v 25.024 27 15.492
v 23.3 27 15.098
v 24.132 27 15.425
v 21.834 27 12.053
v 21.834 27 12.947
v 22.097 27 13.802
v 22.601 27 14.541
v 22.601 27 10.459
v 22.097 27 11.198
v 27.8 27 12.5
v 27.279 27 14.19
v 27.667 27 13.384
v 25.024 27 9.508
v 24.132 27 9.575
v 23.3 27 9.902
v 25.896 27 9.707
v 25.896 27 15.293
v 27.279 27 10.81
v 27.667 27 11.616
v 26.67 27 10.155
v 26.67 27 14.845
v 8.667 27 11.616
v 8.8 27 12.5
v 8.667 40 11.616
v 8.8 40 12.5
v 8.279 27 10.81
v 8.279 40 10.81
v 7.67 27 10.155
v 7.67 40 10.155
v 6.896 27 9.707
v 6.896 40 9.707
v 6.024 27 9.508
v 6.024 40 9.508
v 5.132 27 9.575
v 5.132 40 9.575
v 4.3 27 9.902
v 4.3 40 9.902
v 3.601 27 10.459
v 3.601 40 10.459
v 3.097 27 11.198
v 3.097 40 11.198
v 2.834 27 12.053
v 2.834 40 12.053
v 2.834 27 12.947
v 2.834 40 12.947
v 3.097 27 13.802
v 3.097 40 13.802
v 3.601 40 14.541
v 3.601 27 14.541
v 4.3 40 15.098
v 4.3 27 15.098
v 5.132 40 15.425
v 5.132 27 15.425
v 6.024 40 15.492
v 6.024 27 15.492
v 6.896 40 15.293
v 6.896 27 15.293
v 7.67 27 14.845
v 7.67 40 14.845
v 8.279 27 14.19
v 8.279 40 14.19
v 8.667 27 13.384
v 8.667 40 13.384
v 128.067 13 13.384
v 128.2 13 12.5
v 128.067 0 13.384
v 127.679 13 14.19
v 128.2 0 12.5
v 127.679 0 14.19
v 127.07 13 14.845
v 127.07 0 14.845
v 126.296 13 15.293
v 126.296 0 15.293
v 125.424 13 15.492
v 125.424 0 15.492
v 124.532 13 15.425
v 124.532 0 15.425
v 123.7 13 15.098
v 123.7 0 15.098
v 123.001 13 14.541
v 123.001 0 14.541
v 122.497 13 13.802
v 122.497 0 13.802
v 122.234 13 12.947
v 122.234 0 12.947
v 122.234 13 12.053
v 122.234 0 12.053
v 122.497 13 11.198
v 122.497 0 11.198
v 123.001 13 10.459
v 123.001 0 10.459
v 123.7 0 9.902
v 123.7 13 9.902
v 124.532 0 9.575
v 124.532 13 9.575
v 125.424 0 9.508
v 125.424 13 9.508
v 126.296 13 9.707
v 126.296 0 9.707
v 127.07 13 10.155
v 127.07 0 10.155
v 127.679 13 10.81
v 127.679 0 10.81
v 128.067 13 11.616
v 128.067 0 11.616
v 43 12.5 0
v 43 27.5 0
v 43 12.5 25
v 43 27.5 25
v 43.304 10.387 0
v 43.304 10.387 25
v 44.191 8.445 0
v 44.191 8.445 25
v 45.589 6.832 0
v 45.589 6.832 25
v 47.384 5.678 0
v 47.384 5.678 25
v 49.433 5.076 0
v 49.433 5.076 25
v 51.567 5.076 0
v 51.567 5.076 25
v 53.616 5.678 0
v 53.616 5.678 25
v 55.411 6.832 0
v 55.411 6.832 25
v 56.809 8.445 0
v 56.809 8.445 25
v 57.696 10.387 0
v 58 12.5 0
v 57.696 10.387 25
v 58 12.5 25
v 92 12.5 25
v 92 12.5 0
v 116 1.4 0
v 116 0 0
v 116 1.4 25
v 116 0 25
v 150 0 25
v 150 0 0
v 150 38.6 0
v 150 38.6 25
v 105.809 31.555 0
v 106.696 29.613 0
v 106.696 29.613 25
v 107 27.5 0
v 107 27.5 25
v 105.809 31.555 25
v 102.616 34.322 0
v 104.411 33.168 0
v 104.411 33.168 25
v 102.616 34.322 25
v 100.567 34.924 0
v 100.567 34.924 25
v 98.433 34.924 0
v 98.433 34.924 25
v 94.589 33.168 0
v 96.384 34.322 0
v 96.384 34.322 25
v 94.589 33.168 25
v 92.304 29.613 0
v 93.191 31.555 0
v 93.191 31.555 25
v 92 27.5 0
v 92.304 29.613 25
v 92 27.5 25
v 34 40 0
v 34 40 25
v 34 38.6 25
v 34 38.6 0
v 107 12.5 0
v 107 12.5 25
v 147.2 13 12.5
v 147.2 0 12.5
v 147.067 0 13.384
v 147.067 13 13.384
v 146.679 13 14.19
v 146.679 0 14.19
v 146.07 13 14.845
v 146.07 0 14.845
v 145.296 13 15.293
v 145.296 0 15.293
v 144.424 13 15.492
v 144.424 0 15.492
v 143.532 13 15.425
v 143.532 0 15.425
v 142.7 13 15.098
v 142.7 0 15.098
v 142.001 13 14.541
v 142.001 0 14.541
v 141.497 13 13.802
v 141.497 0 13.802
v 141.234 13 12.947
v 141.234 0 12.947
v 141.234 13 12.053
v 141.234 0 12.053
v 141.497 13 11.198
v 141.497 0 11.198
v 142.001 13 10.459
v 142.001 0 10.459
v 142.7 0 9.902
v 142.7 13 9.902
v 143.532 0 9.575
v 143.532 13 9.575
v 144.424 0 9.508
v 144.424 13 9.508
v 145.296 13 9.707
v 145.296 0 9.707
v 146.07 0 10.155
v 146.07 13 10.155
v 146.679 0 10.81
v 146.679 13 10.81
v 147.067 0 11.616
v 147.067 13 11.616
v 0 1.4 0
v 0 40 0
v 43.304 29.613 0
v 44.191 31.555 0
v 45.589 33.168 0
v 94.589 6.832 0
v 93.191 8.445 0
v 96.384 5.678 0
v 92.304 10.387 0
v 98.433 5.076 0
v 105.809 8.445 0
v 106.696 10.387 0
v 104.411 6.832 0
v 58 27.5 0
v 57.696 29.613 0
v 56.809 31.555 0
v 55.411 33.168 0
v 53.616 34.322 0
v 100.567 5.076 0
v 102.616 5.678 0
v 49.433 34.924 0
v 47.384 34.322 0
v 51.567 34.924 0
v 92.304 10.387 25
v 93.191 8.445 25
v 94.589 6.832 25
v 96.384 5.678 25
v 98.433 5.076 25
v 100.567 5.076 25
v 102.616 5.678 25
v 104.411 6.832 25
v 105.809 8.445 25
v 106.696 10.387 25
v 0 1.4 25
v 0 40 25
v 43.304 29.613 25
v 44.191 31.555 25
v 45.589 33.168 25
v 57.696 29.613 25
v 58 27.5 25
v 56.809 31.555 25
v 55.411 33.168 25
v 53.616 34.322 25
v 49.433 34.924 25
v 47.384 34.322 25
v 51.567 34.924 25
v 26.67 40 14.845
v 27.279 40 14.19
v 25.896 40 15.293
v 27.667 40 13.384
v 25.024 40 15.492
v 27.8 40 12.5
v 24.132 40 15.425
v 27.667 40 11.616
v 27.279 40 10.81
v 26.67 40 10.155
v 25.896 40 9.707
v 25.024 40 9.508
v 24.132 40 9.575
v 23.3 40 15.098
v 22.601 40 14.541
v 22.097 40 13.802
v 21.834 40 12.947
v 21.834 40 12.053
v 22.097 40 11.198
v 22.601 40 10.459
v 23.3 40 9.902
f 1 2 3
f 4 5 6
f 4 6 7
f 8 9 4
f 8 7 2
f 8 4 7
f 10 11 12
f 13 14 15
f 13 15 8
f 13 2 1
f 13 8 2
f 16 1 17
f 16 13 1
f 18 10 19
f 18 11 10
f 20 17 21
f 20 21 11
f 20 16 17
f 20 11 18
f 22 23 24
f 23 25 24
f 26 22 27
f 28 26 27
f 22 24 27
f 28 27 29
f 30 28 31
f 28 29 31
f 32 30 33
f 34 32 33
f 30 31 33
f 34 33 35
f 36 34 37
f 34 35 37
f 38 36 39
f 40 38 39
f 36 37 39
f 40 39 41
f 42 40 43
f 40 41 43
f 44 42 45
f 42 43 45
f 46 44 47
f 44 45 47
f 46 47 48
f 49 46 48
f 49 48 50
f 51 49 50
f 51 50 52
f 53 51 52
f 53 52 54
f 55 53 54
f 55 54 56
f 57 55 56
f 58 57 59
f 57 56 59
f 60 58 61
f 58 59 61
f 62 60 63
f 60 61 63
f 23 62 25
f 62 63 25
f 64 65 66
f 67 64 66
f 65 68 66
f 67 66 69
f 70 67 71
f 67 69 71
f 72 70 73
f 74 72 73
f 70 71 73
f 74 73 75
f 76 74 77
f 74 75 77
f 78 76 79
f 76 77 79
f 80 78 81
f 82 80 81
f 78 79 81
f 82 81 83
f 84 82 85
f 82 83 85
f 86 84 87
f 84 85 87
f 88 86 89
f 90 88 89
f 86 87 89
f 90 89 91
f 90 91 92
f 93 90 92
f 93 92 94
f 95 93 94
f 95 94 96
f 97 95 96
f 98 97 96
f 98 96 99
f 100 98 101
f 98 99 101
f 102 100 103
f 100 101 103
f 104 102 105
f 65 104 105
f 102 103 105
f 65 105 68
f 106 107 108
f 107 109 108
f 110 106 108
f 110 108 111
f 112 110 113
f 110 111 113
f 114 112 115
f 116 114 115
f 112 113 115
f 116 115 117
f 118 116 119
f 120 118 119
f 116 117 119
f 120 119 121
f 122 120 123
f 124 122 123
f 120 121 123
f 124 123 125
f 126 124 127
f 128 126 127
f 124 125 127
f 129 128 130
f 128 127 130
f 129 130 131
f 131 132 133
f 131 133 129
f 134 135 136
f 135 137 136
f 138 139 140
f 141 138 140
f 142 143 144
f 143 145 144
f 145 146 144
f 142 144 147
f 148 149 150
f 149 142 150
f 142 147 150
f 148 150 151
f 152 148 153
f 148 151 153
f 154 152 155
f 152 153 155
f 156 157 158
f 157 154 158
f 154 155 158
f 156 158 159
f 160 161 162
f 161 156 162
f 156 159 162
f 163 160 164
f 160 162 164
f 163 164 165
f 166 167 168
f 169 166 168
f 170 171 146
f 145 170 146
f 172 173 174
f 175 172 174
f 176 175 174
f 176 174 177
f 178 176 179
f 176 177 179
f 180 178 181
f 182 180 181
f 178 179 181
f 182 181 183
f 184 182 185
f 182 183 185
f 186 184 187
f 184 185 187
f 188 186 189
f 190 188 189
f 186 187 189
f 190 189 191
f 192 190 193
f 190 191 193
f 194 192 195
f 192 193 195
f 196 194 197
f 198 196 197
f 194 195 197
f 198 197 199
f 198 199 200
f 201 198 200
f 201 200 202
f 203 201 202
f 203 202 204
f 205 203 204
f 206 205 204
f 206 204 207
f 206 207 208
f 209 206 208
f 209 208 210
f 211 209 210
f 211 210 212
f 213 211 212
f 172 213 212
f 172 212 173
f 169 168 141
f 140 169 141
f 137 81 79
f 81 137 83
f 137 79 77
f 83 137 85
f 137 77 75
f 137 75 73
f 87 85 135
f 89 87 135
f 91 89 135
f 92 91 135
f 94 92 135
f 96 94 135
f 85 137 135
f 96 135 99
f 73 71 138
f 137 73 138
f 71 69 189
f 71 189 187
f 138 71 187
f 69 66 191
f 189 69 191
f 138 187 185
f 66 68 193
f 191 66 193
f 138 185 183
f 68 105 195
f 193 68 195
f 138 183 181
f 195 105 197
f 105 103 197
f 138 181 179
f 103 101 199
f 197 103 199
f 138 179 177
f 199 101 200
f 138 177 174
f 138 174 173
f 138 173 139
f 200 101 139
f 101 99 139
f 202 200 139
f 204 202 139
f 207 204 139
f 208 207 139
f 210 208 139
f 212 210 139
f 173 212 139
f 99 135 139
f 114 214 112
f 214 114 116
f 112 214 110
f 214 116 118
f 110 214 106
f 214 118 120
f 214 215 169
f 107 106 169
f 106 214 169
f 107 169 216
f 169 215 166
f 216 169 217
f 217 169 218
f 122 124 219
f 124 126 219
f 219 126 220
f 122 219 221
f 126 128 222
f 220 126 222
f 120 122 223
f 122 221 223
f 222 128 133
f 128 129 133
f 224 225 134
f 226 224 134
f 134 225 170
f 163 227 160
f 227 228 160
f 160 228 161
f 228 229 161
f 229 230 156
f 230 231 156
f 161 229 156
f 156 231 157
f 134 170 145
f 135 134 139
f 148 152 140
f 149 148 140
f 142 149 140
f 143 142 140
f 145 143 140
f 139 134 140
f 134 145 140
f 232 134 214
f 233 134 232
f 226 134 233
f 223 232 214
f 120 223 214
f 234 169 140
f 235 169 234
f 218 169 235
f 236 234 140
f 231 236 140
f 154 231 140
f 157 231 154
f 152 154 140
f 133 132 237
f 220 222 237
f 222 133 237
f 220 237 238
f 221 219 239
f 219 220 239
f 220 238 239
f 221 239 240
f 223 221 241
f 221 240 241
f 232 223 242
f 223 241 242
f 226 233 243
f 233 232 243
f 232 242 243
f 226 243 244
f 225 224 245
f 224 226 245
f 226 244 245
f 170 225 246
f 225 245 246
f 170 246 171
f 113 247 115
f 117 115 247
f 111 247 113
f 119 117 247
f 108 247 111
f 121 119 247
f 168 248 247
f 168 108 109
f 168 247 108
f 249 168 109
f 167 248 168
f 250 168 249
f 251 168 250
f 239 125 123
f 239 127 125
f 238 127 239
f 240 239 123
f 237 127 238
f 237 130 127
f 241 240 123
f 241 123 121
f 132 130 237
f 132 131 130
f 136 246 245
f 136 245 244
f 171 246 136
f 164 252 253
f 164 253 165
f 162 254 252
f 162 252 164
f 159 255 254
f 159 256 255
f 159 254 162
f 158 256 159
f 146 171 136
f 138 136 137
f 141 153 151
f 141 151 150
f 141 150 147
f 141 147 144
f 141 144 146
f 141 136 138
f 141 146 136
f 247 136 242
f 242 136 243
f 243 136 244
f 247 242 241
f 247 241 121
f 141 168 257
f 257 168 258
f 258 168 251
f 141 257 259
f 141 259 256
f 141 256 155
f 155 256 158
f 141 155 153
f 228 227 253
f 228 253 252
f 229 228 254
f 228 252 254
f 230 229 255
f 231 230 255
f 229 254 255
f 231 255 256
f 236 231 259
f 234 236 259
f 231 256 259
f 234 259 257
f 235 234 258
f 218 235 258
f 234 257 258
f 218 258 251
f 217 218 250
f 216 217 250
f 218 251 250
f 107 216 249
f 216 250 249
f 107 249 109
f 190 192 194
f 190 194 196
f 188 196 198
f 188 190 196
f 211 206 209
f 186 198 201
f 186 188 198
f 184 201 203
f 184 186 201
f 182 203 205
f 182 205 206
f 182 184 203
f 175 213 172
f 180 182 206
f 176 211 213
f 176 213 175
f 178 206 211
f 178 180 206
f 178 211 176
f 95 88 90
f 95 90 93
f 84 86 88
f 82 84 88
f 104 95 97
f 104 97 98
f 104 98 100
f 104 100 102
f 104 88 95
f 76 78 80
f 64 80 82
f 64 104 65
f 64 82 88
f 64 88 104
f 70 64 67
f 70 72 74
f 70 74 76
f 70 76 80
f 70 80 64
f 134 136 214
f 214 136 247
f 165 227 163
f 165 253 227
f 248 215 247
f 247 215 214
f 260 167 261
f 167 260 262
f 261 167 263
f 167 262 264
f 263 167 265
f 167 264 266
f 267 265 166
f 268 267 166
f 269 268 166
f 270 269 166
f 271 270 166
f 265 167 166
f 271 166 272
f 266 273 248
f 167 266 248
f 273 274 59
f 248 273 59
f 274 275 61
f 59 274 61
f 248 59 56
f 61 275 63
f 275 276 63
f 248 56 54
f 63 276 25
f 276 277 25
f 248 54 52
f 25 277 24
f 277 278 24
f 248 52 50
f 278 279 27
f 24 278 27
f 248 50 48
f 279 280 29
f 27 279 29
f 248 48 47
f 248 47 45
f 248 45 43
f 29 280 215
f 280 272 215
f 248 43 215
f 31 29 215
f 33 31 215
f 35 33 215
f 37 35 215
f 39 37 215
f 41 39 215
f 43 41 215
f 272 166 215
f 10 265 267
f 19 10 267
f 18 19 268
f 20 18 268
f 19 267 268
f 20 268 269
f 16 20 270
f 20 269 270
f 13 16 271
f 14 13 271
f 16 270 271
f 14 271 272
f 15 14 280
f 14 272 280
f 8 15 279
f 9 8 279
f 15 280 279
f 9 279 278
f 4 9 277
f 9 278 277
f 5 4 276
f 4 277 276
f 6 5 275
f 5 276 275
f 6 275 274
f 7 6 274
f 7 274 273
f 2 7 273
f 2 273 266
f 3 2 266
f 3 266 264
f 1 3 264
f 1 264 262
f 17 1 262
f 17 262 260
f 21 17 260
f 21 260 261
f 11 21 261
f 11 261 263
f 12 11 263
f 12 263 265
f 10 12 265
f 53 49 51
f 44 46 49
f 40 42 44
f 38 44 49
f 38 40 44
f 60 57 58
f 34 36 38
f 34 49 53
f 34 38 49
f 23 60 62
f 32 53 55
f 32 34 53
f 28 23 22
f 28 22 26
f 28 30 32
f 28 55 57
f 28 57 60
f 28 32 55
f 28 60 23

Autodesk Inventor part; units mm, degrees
ref_plane "YZ Plane" through (0, 0, 0) normal (1, 0, 0) x (0, 1, 0)
ref_plane "XZ Plane" through (0, 0, 0) normal (0, 1, 0) x (-1, 0, 0)
ref_plane "XY Plane" through (0, 0, 0) normal (0, 0, 1) x (1, 0, 0)
sketch "Sketch1" plane through (0, 0, 0) normal (0, 0, 1) x (1, 0, 0)
  line L0 (0, 0) -> (150, 0)
  line L1 (150, 0) -> (150, 40)
  line L2 (150, 40) -> (0, 40)
  line L3 (0, 40) -> (0, 0)
  dimension "d0" = 40
  dimension "d1" = 150
extrude "Extrusion1" add sketch "Sketch1" along normal blind 25
sketch "Sketch2" plane through (0, 0, 25) normal (0, 0, 1) x (1, 0, 0)
  arc A0 (58, 27.5) -> (43, 27.5) centre (50.5, 27.5) ccw
  line L0 (43, 27.5) -> (43, 12.5)
  arc A1 (43, 12.5) -> (58, 12.5) centre (50.5, 12.5) ccw
  line L1 (58, 27.5) -> (75, 27.5)
  line L2 (75, 27.5) -> (75, 12.5)
  line L3 (75, 12.5) -> (58, 12.5)
  line L4 (0, 0) -> (150, 0) projected
  line L5 (75, 0) -> (75, 12.5)
  dimension "d4" = 7.5
  dimension "d5" = 15
  dimension "d6" = 12.5
  dimension "d7" = 17
  dimension "d8" = 7.5
extrude "Extrusion2" cut sketch "Sketch2" against normal blind 25
sketch "Sketch3" plane through (0, 40, 0) normal (0, 1, 0) x (1, 0, 0)
  circle A0 centre (5.8, -12.5) radius 3
  circle A1 centre (24.8, -12.5) radius 3
  line L0 (0, 0) -> (0, -25) projected
  line L1 (150, -25) -> (0, -25) projected
  dimension "d11" = 6
  dimension "d12" = 6
  dimension "d13" = 19
  dimension "d14" = 5.8
  dimension "d15" = 12.5
  dimension "d16" = 12.5
extrude "Extrusion3" cut sketch "Sketch3" against normal blind 13
mirror "Mirror1" about plane through (75, 27.5, 25) normal (-1, 0, 0) of "Extrusion2"
sketch "Sketch4" plane through (0, 0, 0) normal (0, -1, 0) x (1, 0, 0)
  circle A0 centre (144.2, 12.5) radius 3
  circle A1 centre (125.2, 12.5) radius 3
  line L0 (150, 0) -> (150, 25) projected
  line L1 (0, 0) -> (150, 0) projected
  dimension "d19" = 6
  dimension "d20" = 5.8
  dimension "d21" = 12.5
  dimension "d22" = 19
  dimension "d23" = 12.5
extrude "Extrusion4" cut sketch "Sketch4" against normal blind 13
sketch "Sketch5" plane through (0, 0, 25) normal (0, 0, 1) x (1, 0, 0)
  line L0 (150, 0) -> (150, 40) projected
  line L1 (150, 40) -> (34, 40)
  line L2 (34, 40) -> (34, 38.6)
  line L3 (34, 38.6) -> (150, 38.6)
  line L4 (150, 38.6) -> (150, 40)
  line L5 (0, 40) -> (0, 0) projected
  line L6 (0, 0) -> (116, 0)
  line L7 (116, 0) -> (116, 1.4)
  line L8 (116, 1.4) -> (0, 1.4)
  line L9 (0, 1.4) -> (0, 0)
  point P0 (34, 39.3)
  point P1 (116, 0.7)
  point P2 (0, 1.4)
  dimension "d26" = 1.4
  dimension "d27" = 34
  dimension "d28" = 34
  dimension "d29" = 1.4
extrude "Extrusion5" cut sketch "Sketch5" against normal blind 25
properties part number "load_cell"
